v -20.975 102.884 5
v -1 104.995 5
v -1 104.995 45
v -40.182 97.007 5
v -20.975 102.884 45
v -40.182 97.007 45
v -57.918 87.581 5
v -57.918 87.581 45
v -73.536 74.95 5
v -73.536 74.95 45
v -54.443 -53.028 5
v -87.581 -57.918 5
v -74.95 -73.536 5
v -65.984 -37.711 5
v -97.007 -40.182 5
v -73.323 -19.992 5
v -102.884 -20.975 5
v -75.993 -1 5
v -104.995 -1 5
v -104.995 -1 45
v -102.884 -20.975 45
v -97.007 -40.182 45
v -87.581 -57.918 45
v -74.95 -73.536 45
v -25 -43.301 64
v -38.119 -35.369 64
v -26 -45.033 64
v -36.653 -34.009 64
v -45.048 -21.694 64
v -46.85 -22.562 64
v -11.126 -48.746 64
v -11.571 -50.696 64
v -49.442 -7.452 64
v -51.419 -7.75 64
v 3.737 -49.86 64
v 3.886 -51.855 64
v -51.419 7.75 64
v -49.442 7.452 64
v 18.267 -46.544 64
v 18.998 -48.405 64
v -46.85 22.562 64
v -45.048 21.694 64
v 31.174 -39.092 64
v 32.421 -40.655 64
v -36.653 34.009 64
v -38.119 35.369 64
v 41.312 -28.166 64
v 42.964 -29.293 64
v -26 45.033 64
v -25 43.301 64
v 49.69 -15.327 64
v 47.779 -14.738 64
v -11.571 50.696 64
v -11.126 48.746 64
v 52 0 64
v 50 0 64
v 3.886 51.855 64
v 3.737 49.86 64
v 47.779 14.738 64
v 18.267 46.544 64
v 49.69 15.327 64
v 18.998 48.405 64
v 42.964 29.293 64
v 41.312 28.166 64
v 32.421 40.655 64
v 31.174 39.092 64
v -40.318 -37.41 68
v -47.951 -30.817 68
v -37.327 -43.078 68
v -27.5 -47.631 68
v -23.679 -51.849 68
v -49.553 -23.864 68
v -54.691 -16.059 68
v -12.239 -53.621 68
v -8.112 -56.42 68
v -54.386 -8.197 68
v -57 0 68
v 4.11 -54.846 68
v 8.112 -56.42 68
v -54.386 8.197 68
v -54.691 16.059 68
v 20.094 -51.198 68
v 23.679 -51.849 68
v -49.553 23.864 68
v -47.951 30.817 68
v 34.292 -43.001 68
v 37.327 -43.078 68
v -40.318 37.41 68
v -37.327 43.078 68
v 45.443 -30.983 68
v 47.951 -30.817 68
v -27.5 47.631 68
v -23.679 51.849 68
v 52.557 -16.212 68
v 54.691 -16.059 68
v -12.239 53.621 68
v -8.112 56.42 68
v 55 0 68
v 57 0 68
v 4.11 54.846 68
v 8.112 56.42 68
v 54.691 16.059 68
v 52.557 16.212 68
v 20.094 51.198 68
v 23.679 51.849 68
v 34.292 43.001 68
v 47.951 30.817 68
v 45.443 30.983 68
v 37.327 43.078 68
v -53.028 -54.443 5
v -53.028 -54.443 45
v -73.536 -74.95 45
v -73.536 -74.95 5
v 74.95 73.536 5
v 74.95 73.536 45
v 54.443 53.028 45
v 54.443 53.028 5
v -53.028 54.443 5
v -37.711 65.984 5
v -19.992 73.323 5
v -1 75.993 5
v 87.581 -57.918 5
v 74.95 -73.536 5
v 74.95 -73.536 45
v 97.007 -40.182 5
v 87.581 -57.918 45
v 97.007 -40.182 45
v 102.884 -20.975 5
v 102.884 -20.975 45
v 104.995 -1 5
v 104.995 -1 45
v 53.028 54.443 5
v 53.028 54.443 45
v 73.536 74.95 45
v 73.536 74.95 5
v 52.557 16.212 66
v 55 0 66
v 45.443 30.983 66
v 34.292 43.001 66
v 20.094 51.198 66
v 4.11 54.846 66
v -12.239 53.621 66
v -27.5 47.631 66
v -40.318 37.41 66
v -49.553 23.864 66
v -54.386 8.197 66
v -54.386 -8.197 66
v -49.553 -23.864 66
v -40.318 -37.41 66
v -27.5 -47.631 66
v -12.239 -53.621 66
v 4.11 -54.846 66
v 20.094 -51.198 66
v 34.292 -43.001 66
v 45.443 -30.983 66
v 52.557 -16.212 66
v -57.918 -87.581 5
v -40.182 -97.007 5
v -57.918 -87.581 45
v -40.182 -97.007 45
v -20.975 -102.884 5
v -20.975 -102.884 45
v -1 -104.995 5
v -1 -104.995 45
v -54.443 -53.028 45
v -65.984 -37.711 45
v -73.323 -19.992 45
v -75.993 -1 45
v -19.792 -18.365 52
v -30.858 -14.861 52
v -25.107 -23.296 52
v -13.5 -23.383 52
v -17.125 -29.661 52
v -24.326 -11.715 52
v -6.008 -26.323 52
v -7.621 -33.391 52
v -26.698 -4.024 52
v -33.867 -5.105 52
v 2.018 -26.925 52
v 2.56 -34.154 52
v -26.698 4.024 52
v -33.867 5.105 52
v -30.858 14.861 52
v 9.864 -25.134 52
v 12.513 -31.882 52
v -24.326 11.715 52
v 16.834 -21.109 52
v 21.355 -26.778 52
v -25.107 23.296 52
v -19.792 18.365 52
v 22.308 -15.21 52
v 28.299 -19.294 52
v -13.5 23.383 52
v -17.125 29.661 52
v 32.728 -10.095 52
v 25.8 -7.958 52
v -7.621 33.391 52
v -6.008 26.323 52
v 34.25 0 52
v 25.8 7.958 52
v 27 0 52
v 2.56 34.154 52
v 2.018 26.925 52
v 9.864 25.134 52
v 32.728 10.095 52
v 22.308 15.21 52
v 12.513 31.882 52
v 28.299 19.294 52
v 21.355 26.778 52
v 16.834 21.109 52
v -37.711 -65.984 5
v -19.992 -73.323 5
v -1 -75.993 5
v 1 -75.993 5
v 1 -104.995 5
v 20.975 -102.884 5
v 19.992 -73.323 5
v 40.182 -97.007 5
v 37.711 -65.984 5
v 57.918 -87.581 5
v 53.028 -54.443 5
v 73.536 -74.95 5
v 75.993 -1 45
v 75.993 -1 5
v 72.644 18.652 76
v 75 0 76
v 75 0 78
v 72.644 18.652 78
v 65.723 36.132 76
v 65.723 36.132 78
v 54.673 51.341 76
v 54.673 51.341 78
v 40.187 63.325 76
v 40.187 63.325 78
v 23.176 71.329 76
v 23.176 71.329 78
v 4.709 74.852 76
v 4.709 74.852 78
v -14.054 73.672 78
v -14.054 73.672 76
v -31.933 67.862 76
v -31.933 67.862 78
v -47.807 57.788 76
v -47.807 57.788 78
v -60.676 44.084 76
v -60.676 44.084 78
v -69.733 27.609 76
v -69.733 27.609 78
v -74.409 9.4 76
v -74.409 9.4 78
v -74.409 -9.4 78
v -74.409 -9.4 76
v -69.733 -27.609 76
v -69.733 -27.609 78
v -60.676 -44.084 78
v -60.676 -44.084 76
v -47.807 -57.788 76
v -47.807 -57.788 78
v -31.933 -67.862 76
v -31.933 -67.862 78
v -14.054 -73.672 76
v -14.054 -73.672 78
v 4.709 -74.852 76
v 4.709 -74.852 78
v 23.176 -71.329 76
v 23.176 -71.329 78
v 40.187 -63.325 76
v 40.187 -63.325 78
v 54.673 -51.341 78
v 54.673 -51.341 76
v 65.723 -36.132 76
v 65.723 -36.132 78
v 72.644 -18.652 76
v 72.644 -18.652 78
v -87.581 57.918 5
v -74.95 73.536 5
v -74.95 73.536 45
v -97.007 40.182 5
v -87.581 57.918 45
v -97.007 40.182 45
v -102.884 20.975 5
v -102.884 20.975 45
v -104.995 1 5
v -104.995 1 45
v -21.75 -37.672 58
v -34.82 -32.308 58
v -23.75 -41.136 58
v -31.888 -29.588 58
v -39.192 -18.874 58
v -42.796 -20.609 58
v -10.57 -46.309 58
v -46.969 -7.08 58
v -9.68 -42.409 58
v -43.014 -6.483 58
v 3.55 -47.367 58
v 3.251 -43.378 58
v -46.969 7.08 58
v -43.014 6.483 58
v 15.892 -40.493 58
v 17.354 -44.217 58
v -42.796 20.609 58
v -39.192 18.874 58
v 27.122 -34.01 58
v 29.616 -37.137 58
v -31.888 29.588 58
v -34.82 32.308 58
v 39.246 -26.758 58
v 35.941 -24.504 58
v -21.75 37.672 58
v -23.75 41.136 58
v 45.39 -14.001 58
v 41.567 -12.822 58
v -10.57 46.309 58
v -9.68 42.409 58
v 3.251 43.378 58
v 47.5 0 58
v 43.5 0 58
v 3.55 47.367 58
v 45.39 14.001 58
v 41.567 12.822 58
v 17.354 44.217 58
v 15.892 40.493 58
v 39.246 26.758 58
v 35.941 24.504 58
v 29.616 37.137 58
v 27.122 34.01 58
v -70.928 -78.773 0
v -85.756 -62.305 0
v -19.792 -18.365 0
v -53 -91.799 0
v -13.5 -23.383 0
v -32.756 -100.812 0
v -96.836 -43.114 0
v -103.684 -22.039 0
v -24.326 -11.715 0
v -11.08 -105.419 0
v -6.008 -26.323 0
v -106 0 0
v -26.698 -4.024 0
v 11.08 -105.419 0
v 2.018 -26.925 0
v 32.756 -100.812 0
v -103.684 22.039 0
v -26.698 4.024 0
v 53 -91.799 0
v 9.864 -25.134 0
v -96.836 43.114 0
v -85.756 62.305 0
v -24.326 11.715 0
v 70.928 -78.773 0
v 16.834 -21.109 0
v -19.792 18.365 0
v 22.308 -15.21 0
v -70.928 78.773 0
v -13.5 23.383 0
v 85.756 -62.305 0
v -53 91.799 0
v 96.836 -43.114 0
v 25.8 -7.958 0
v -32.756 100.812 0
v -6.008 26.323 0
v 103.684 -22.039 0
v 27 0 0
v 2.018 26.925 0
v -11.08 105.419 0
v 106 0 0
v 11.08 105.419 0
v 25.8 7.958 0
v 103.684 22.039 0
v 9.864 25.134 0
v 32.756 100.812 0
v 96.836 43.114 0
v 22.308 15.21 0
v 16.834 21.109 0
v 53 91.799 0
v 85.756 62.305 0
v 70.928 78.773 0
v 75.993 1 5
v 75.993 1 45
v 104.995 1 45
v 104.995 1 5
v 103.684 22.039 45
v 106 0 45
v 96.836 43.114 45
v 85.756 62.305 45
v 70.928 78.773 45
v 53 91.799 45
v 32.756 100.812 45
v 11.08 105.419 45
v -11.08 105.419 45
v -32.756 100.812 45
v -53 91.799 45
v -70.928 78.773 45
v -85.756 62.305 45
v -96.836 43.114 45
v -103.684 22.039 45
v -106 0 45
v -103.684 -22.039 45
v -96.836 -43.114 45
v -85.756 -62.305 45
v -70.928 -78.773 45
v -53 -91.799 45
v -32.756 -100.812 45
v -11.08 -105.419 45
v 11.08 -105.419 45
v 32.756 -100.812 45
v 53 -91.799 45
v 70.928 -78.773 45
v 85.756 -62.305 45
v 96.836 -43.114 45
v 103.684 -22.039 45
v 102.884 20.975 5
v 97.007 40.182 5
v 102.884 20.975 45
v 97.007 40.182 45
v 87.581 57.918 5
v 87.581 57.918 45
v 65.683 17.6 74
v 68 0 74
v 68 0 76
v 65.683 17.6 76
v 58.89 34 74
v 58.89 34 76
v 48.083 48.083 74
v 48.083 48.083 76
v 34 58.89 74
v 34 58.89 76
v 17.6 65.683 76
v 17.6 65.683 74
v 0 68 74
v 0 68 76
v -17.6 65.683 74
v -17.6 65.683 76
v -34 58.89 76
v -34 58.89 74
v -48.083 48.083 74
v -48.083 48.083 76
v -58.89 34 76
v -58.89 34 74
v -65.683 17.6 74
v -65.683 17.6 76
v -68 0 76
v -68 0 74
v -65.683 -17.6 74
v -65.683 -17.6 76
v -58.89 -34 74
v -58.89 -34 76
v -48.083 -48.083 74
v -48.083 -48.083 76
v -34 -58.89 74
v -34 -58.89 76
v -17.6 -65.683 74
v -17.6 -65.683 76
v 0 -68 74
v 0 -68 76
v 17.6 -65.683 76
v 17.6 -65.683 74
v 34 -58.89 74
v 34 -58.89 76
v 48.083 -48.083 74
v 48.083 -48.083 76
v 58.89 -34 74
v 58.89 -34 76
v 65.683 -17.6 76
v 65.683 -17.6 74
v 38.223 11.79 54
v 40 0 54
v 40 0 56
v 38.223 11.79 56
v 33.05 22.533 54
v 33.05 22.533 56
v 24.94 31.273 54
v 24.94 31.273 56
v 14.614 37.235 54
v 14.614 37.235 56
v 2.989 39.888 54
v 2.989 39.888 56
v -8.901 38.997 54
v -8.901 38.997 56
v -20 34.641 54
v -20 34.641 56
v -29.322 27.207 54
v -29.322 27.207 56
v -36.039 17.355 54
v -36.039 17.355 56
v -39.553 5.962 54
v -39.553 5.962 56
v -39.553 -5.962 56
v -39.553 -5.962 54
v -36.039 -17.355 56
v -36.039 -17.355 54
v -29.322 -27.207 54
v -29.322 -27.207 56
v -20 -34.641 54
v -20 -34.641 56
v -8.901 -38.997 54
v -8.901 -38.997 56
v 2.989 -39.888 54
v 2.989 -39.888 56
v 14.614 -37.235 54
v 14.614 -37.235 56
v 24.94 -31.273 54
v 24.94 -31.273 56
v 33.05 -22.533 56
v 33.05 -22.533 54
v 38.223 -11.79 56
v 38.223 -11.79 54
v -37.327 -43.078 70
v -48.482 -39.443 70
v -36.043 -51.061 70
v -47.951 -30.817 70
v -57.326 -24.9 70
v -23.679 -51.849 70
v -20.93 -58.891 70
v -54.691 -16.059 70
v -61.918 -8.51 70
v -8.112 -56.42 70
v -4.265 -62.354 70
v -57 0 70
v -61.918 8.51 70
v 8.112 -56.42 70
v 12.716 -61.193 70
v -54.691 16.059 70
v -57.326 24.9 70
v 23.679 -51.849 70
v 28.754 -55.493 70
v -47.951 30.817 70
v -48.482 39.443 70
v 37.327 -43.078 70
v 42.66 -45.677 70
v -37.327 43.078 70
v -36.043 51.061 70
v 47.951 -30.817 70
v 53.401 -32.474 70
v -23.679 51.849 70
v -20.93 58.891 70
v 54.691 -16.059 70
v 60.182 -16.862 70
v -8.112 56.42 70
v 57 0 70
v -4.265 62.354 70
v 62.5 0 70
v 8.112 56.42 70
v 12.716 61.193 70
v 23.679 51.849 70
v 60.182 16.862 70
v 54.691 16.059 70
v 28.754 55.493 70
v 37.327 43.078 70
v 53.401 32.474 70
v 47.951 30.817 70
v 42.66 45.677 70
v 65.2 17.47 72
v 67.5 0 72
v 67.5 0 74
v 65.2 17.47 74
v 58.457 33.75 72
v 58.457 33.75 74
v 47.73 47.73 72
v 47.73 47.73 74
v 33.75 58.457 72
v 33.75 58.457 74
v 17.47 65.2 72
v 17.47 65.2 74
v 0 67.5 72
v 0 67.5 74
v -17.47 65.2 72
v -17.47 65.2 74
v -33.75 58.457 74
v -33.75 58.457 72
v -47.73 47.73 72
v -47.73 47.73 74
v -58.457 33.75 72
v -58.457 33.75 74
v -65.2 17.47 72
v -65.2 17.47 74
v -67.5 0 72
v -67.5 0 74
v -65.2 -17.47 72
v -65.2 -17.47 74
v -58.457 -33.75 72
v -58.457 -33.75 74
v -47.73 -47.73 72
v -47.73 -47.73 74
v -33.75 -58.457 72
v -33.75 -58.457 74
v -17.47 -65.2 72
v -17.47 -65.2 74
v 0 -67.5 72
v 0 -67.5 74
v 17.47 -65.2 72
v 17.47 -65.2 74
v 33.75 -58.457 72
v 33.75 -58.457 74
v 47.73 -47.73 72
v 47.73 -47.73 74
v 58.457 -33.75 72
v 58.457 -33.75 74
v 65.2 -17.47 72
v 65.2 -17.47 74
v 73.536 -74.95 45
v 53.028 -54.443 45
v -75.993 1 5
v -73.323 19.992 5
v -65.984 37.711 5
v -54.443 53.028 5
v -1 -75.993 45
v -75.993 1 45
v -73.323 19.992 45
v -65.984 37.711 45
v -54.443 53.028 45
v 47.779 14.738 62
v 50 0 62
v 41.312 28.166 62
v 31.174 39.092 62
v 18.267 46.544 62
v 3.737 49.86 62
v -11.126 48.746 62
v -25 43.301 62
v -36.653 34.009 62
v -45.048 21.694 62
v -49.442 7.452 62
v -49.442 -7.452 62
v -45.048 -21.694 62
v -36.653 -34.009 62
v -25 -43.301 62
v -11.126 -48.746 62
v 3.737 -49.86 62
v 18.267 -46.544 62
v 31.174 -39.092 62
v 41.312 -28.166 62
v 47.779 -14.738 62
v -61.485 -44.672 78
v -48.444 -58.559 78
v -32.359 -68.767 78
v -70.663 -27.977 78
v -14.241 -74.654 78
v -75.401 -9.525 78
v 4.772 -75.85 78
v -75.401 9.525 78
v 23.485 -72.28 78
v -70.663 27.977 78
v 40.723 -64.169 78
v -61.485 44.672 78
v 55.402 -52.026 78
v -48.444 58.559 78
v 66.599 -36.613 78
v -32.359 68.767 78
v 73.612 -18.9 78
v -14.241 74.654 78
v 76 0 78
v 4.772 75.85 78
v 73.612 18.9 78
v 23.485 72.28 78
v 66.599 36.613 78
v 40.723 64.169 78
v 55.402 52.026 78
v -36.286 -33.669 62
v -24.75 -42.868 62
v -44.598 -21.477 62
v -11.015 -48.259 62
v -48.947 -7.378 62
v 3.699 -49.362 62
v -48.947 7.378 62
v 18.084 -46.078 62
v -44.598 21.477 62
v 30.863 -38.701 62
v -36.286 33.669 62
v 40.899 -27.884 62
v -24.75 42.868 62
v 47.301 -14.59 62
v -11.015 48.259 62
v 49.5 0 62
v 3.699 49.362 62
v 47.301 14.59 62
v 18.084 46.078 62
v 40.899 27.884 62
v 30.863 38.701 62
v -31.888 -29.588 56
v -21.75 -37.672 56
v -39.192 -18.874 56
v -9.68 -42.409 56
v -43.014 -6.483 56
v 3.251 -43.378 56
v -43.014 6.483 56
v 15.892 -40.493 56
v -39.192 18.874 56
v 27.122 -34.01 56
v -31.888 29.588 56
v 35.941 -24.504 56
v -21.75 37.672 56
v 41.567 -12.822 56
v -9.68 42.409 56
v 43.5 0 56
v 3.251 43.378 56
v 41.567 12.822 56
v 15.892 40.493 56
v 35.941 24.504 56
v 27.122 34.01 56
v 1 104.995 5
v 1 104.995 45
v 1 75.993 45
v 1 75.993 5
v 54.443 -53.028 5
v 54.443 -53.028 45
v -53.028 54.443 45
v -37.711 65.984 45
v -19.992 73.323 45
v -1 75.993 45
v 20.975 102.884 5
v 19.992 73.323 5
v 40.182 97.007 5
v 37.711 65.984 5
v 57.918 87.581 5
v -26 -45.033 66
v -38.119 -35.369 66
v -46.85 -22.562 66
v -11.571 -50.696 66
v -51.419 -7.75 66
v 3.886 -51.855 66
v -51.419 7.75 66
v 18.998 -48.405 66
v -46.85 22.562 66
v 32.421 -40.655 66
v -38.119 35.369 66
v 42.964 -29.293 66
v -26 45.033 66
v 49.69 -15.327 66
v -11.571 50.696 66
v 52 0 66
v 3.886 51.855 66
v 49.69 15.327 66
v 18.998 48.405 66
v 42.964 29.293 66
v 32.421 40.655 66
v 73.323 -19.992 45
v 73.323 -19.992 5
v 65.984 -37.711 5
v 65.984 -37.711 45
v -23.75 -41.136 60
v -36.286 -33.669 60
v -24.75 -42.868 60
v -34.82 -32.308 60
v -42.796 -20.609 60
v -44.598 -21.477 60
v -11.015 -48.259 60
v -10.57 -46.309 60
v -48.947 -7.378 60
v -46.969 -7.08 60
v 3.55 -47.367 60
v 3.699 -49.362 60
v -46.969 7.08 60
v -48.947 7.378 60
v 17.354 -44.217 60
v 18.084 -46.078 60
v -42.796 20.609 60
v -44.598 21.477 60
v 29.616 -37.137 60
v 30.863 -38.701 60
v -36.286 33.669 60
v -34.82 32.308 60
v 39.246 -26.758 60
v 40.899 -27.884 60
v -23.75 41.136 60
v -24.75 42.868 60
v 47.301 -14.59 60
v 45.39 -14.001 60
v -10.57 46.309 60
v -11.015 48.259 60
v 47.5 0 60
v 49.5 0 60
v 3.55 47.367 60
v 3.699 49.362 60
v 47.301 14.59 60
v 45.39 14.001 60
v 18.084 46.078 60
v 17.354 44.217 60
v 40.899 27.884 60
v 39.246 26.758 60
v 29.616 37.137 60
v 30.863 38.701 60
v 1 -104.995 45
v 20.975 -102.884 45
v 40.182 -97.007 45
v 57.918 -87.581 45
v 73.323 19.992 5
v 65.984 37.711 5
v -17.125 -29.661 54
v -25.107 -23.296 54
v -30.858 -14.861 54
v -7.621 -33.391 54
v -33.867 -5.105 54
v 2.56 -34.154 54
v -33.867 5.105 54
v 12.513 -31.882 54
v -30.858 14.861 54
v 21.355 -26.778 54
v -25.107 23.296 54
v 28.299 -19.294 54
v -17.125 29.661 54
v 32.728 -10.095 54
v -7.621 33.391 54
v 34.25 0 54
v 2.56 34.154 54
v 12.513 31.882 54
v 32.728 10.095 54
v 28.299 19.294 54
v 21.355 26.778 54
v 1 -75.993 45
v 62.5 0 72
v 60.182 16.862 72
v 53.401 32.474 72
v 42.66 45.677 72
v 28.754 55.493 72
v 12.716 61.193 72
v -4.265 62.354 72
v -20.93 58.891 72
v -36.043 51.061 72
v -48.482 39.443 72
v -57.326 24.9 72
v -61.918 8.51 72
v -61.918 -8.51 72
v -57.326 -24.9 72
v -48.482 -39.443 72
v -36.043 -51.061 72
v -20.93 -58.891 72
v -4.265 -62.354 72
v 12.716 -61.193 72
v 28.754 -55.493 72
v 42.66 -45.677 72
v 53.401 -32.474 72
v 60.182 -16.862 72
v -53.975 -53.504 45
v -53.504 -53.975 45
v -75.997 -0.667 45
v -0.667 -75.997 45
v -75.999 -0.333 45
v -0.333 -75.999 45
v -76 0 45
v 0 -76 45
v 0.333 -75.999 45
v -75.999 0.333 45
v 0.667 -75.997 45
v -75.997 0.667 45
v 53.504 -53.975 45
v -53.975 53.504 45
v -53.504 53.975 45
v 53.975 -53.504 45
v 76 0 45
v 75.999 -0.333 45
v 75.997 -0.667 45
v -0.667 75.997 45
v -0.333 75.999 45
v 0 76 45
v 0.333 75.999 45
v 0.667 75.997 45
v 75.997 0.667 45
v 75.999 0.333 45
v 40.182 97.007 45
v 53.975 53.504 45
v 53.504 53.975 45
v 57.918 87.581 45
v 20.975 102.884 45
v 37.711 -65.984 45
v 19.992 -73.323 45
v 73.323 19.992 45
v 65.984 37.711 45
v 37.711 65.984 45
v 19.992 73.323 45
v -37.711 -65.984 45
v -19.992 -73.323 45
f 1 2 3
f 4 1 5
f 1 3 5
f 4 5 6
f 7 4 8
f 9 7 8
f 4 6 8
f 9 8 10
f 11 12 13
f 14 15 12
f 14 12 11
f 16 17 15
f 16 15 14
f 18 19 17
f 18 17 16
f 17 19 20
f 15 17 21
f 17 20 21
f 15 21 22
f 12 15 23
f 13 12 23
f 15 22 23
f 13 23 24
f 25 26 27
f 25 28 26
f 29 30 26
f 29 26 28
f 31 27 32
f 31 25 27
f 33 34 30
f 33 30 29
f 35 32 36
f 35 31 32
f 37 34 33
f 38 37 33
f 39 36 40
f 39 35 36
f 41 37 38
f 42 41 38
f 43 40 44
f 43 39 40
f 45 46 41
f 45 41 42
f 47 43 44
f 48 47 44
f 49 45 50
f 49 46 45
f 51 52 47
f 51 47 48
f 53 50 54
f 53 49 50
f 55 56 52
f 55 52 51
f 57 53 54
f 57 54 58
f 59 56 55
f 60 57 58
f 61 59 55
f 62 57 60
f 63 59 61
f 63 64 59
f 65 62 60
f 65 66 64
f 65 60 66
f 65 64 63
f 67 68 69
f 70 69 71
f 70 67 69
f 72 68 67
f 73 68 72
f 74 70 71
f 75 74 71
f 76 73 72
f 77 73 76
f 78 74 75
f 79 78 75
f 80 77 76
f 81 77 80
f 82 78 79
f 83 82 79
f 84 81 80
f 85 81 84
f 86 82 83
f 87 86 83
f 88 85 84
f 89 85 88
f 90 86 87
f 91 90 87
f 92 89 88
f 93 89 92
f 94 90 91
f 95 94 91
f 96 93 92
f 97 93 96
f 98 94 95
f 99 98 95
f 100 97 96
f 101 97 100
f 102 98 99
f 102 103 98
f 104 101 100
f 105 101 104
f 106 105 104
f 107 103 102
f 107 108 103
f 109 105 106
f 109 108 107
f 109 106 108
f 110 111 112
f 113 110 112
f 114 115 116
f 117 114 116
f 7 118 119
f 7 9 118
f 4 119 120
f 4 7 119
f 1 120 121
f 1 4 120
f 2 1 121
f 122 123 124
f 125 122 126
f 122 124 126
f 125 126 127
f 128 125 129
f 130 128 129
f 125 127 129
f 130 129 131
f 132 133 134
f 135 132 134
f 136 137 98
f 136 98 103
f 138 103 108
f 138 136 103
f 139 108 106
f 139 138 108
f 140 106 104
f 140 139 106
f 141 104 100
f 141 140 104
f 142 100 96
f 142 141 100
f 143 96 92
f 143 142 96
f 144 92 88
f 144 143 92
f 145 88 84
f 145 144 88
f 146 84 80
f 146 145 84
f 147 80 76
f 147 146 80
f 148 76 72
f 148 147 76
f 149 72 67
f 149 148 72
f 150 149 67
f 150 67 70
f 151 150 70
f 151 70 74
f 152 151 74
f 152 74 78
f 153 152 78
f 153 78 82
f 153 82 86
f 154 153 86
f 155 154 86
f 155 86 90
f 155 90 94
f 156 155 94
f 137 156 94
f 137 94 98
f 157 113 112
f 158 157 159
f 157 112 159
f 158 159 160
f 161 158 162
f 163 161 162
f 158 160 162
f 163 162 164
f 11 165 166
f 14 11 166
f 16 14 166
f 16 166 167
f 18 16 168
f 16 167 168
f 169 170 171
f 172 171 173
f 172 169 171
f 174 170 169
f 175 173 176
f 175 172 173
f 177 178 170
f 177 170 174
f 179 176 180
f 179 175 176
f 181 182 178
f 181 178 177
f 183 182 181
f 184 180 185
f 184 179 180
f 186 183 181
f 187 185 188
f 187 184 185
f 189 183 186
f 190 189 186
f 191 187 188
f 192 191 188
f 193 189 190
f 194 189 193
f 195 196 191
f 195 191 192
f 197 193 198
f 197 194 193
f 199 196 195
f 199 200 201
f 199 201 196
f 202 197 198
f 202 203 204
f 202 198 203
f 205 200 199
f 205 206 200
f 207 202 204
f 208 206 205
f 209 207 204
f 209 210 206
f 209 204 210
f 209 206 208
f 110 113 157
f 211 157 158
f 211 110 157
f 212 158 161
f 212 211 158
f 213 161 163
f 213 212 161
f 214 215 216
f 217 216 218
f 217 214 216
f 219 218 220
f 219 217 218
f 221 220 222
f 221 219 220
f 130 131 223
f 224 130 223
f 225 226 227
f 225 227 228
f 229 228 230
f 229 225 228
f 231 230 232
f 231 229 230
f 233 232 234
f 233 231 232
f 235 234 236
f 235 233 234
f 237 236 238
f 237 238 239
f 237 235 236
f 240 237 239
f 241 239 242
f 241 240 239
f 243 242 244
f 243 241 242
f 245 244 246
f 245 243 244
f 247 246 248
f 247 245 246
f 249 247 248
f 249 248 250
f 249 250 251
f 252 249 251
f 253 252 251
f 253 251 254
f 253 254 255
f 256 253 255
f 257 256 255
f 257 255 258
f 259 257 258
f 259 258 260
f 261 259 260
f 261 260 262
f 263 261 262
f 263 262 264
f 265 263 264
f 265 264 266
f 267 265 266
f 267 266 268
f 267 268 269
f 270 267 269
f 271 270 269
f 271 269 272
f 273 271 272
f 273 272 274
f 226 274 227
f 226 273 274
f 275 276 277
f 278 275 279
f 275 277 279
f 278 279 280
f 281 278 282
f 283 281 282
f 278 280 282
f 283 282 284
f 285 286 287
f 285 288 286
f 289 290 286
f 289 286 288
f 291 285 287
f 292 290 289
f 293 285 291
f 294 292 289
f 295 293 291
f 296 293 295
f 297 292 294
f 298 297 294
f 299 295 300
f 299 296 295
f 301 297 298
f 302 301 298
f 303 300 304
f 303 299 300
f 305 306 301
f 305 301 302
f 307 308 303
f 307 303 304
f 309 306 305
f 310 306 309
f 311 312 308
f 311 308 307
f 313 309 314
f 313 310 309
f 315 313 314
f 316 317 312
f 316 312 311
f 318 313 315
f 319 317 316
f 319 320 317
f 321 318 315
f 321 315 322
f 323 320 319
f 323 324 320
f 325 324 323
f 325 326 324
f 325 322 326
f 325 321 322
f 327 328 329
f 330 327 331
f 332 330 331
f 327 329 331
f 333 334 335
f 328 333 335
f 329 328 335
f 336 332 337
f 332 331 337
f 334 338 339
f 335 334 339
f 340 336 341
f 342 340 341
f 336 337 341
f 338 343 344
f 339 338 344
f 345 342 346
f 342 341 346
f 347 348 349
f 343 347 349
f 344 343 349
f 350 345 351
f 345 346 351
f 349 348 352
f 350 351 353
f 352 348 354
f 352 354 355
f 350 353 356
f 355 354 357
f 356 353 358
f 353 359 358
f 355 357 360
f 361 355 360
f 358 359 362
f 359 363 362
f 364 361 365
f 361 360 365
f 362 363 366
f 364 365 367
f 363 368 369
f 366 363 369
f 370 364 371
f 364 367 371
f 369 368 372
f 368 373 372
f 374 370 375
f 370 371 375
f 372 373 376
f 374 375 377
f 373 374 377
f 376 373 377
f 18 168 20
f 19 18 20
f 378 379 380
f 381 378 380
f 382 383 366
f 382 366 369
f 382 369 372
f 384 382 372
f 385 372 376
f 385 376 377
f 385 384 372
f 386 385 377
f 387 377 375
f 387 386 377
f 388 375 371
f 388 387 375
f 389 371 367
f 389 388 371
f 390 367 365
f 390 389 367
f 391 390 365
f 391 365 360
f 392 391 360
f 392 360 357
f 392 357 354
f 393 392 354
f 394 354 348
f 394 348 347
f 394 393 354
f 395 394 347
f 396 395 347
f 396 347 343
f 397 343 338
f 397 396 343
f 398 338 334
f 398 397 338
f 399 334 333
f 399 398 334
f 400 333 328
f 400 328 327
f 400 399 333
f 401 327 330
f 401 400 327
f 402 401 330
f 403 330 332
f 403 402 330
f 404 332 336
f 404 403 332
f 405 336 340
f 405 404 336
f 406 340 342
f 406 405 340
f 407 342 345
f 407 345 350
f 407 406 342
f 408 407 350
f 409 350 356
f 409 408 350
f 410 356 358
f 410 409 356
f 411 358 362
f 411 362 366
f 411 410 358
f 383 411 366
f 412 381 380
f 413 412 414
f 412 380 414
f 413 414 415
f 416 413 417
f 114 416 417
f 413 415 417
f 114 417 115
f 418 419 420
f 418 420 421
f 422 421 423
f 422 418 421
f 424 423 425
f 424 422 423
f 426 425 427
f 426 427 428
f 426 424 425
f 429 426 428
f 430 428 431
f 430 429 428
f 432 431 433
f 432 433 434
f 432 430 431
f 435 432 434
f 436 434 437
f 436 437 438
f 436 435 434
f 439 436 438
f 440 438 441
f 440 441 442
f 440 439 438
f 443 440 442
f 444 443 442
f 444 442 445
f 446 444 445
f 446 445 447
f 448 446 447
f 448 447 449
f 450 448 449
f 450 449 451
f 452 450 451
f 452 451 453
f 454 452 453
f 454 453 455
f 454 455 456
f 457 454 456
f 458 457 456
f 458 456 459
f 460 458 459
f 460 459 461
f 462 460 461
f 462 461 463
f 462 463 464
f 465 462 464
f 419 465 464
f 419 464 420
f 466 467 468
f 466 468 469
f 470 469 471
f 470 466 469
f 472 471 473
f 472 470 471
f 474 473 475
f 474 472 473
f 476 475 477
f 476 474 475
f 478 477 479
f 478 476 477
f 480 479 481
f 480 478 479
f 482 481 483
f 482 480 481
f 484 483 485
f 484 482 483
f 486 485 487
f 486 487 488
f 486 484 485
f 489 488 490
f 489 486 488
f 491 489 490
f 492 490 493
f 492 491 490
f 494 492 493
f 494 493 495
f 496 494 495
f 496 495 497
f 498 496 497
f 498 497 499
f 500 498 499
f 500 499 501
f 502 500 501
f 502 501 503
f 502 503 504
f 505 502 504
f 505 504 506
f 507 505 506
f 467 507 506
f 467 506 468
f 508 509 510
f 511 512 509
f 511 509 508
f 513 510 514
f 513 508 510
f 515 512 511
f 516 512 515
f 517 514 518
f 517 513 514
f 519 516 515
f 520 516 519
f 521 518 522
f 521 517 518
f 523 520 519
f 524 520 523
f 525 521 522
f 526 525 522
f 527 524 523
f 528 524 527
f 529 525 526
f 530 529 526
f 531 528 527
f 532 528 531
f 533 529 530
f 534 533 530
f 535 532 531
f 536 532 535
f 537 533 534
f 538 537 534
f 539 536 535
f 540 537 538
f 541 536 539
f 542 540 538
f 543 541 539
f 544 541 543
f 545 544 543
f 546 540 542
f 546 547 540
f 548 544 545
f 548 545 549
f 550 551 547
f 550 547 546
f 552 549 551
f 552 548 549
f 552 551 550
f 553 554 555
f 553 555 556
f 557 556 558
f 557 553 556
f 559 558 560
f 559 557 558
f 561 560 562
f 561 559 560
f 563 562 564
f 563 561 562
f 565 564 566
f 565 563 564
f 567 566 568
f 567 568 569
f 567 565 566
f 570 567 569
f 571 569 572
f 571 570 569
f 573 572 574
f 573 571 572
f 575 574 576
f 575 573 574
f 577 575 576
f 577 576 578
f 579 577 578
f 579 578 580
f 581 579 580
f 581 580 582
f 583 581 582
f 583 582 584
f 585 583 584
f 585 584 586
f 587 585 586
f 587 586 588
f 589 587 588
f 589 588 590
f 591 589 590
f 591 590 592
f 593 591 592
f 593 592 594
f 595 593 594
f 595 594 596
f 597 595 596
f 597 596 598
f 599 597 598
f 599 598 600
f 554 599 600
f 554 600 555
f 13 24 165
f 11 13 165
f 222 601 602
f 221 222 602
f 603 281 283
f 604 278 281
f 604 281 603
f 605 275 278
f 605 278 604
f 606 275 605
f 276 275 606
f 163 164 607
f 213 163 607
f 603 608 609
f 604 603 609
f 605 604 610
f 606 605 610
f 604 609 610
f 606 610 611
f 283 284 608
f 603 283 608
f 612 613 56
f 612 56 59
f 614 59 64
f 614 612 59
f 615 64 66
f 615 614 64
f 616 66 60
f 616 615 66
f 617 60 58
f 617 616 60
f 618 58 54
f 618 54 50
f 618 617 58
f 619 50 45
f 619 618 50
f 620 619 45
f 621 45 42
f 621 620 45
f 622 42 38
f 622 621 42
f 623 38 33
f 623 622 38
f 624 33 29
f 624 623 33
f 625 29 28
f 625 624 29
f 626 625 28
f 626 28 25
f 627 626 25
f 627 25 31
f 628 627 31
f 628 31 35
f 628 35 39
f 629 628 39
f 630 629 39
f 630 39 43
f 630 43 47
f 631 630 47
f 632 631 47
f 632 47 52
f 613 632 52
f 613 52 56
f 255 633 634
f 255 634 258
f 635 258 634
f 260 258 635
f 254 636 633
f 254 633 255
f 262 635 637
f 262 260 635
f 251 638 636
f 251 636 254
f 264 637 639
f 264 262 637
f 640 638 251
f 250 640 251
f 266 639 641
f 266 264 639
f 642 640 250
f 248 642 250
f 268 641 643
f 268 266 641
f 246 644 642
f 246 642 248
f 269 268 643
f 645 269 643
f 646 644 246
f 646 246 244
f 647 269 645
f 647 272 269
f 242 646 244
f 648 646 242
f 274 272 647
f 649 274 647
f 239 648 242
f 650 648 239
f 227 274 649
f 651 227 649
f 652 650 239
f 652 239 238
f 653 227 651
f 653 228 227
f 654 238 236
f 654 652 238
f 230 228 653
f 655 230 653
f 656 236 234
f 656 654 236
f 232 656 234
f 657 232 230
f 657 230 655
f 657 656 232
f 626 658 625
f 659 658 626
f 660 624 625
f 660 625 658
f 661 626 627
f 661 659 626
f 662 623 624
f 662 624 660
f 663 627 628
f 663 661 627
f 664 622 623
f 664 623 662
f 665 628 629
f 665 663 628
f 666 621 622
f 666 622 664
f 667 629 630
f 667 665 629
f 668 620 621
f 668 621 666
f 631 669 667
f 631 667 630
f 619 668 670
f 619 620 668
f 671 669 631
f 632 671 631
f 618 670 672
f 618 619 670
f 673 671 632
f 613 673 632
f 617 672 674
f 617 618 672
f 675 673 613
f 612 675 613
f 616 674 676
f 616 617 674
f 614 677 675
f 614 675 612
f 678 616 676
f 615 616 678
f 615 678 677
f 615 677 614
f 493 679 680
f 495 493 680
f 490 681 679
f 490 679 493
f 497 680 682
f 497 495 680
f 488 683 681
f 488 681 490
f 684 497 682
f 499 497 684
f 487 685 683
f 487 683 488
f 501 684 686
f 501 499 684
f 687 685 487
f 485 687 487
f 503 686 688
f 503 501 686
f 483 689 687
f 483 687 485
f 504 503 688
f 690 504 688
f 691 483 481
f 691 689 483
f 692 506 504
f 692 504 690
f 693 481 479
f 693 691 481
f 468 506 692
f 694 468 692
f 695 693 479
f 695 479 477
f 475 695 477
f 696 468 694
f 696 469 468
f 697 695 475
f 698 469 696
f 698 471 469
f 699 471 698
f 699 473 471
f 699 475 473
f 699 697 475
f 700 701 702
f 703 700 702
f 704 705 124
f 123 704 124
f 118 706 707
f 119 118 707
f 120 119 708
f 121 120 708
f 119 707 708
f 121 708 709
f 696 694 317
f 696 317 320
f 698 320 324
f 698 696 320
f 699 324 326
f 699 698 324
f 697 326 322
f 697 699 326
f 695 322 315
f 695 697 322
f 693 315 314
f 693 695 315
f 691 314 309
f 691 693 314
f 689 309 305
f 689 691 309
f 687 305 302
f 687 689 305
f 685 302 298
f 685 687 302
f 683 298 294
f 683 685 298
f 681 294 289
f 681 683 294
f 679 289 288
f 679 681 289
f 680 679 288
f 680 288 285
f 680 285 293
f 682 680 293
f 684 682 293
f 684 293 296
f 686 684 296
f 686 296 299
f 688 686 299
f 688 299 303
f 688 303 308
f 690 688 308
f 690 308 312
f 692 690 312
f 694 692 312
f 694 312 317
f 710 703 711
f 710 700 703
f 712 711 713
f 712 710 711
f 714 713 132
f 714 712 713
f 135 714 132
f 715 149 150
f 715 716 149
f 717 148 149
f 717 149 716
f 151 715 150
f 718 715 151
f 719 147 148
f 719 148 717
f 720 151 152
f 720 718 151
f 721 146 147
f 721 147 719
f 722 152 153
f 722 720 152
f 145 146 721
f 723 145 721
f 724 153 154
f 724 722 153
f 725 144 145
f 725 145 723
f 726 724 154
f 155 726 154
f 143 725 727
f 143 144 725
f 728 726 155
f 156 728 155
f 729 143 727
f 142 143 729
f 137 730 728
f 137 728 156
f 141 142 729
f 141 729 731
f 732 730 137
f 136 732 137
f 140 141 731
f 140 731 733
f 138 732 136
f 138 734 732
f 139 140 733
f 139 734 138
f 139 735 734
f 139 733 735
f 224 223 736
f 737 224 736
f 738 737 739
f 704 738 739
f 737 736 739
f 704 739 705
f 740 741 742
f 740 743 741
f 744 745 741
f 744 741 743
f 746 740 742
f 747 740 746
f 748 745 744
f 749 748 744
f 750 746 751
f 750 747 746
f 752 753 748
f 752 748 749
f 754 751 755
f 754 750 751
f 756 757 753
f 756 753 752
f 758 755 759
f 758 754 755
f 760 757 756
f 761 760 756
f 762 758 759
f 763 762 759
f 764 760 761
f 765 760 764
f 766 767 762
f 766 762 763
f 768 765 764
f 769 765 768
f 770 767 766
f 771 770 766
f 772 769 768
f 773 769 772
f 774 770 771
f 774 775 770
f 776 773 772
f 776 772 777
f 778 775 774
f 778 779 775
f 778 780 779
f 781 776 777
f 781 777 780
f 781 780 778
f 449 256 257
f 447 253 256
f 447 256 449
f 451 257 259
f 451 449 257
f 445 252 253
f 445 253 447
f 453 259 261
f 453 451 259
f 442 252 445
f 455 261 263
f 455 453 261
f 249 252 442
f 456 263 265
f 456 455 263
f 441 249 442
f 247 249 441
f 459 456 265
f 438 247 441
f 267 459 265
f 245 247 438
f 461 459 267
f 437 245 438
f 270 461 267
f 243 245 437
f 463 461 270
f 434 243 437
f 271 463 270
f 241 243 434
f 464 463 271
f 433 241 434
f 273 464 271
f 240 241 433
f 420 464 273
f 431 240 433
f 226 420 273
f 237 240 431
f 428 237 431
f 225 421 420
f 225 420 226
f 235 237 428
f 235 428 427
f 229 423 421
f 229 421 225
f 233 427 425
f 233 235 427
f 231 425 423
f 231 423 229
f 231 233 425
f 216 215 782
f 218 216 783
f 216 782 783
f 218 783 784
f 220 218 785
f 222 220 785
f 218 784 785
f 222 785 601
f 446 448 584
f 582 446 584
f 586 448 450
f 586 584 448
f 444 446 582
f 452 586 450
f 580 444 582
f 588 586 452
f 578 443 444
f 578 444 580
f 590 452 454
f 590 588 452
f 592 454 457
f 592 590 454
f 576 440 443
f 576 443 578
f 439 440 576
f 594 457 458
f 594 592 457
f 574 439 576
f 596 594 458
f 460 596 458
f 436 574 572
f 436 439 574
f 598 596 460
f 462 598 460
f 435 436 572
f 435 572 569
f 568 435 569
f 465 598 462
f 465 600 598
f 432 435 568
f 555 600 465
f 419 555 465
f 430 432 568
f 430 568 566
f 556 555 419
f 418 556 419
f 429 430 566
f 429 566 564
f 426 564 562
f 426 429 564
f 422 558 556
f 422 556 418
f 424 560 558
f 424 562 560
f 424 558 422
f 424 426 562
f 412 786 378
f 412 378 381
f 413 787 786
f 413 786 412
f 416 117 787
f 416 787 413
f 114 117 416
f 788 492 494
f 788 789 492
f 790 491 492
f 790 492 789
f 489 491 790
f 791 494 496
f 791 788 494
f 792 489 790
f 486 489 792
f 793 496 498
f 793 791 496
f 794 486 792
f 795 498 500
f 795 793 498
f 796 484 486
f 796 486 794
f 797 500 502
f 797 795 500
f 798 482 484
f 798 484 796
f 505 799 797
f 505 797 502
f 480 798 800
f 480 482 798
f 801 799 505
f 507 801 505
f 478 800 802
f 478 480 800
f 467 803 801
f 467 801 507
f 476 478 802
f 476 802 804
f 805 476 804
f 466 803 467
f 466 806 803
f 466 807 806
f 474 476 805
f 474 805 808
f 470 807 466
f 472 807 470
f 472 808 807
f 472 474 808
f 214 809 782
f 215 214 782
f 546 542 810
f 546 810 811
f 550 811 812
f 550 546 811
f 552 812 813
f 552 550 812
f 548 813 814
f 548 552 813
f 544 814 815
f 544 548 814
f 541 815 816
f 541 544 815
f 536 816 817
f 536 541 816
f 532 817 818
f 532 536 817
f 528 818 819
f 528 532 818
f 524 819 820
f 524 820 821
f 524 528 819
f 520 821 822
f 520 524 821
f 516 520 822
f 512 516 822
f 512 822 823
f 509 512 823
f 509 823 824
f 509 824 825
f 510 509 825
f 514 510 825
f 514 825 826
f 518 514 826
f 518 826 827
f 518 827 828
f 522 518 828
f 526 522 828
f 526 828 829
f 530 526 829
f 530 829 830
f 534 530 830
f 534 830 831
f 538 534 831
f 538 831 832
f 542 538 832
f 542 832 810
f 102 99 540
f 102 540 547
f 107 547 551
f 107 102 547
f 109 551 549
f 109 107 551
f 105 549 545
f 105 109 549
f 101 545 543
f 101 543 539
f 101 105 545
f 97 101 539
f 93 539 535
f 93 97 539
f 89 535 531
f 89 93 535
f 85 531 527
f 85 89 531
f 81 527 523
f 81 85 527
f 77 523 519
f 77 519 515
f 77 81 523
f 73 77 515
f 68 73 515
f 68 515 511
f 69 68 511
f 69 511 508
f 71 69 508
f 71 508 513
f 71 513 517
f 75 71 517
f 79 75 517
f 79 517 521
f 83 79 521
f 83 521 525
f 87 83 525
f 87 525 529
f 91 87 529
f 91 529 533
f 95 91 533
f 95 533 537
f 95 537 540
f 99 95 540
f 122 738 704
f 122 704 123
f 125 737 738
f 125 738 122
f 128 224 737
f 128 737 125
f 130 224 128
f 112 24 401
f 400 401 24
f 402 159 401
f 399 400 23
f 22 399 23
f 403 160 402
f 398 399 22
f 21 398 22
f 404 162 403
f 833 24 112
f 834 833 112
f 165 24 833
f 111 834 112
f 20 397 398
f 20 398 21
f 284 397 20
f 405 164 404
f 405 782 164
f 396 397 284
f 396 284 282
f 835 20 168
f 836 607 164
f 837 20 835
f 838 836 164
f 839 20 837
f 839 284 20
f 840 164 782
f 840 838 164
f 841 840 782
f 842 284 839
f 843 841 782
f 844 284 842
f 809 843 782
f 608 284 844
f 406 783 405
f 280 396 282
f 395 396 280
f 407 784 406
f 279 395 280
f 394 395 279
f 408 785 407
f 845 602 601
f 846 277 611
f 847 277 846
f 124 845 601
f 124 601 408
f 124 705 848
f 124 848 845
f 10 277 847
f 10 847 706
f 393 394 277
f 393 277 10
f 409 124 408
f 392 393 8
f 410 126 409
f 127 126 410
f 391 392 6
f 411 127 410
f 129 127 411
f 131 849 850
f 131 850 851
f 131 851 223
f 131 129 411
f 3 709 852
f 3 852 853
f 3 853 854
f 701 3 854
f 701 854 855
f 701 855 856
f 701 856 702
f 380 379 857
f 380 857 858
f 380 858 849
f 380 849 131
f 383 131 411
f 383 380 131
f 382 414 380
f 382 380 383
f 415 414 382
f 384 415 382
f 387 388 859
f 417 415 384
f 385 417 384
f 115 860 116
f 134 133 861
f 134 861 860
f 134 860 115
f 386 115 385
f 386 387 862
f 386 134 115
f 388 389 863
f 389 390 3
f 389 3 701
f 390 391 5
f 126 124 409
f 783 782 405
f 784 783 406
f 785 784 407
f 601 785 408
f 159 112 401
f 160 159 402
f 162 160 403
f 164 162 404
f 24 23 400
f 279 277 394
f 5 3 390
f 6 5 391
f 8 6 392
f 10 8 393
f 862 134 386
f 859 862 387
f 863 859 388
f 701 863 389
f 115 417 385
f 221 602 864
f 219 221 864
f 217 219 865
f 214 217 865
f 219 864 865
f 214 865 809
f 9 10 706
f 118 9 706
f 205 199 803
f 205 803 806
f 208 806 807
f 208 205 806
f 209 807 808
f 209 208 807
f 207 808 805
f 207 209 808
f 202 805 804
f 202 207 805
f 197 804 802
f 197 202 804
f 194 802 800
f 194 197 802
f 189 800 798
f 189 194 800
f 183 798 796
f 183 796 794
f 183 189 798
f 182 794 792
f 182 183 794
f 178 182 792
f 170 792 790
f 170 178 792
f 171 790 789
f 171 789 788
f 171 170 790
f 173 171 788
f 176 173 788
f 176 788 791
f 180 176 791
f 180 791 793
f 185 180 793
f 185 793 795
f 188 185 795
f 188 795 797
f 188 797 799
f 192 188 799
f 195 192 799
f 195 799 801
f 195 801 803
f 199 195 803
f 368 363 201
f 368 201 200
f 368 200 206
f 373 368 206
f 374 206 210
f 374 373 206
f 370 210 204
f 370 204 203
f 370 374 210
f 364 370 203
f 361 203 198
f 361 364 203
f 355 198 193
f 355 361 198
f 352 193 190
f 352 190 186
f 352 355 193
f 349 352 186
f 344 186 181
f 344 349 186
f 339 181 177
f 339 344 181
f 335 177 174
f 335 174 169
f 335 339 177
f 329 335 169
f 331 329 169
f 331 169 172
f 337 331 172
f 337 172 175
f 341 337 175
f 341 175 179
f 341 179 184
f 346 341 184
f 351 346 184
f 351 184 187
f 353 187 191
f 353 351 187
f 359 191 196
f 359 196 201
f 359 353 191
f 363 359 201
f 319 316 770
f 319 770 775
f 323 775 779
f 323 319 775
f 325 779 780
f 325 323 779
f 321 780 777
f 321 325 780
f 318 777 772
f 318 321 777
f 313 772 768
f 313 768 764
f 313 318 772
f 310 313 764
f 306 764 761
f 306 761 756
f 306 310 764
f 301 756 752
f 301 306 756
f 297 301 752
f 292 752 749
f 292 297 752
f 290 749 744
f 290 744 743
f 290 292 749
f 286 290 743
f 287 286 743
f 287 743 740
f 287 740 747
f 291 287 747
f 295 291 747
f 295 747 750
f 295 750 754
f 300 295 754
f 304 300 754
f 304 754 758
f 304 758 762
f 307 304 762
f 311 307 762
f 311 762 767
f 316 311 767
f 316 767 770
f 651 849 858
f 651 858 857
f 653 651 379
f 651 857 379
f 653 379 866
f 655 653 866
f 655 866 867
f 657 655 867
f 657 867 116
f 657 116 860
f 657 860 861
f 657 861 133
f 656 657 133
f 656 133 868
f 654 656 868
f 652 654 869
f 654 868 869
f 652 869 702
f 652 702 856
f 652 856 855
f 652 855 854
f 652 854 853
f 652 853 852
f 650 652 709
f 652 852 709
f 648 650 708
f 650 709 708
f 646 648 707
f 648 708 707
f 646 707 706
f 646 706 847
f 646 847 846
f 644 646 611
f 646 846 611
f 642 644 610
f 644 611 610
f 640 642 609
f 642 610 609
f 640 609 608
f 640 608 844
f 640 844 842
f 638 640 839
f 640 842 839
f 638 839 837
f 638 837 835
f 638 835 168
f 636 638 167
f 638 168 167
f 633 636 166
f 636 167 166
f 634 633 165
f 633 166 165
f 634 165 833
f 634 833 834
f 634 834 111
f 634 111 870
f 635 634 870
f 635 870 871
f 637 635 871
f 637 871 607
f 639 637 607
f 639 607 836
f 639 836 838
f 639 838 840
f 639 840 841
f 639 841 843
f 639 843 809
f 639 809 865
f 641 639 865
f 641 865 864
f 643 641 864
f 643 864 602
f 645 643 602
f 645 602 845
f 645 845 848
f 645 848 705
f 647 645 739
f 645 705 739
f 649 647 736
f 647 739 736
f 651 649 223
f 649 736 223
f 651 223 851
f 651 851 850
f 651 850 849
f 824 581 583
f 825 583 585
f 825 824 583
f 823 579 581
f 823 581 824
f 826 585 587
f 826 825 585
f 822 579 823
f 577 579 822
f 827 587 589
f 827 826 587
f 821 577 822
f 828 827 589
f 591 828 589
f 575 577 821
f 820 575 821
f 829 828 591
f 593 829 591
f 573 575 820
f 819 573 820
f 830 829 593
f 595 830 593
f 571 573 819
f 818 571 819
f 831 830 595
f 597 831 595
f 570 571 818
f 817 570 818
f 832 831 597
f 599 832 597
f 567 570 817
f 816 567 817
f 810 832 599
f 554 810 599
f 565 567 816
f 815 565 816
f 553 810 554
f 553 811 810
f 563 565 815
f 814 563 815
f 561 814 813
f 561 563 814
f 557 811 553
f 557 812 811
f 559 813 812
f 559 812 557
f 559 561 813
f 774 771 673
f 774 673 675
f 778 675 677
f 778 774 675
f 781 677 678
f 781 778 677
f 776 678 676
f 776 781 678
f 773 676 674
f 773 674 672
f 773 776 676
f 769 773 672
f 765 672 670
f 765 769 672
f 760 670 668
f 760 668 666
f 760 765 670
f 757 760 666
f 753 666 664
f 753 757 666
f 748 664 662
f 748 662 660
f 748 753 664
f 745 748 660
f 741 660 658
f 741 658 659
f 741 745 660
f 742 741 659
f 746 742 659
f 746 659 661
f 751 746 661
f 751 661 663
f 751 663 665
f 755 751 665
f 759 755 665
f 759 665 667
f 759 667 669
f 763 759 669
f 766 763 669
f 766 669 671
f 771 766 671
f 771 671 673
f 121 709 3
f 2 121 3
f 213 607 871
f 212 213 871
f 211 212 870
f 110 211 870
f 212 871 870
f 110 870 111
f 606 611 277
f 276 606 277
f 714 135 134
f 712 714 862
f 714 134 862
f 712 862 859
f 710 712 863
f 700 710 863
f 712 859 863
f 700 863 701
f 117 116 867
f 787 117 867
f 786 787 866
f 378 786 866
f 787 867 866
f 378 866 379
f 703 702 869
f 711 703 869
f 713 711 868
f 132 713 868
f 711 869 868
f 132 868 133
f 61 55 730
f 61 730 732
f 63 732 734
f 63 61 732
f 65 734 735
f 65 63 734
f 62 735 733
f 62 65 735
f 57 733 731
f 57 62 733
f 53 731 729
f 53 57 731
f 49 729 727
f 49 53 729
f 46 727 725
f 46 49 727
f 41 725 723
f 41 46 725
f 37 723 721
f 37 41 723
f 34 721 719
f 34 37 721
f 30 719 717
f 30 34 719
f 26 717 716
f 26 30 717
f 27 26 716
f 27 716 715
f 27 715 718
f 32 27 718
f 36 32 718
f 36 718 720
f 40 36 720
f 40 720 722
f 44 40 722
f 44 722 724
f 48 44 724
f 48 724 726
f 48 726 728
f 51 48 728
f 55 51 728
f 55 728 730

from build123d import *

# Parameters (mm, degrees)
F0_R      = 34.25
F0_R_2    = 27
F1_DEPTH  = 52
F2_R      = 40
F2_R_2    = 34.25
F3_DEPTH  = 54
F4_R      = 43.5
F4_R_2    = 40
F5_DEPTH  = 56
F6_R      = 47.5
F6_R_2    = 43.5
F7_DEPTH  = 58
F8_R      = 49.5
F8_R_2    = 47.5
F9_DEPTH  = 60
F10_R     = 50
F10_R_2   = 49.5
F11_DEPTH = 62
F12_R     = 52
F12_R_2   = 50
F13_DEPTH = 64
F14_R     = 55
F14_R_2   = 52
F15_DEPTH = 66
F16_R     = 57
F16_R_2   = 55
F17_DEPTH = 68
F18_R     = 62.5
F18_R_2   = 57
F19_DEPTH = 70
F20_R     = 67.5
F20_R_2   = 62.5
F21_DEPTH = 72
F22_R     = 68
F22_R_2   = 67.5
F23_DEPTH = 74
F24_R     = 75
F24_R_2   = 68
F25_DEPTH = 76
F26_R     = 76
F26_R_2   = 75
F27_DEPTH = 78
F29_DEPTH = 45
F30_R     = 106
F31_DEPTH = 45
F32_DEPTH = 40


# Not quite as in the source:
# - after a boolean that leaves OpenCascade's solid faulty, fix() repairs it


with BuildPart() as f1:
    # F0 (on Top) → F1 (new body)
    with BuildSketch(Plane.XY):
        Circle(F0_R)
        Circle(F0_R_2, mode=Mode.SUBTRACT)
    extrude(amount=F1_DEPTH)

    # F2 (on Top) → F3 (join)
    with BuildSketch(Plane.XY):
        Circle(F2_R)
        Circle(F2_R_2, mode=Mode.SUBTRACT)
    extrude(amount=F3_DEPTH)

    # F4 (on Top) → F5 (join)
    with BuildSketch(Plane.XY):
        Circle(F4_R)
        Circle(F4_R_2, mode=Mode.SUBTRACT)
    extrude(amount=F5_DEPTH)

    # F6 (on Top) → F7 (join)
    with BuildSketch(Plane.XY):
        Circle(F6_R)
        Circle(F6_R_2, mode=Mode.SUBTRACT)
    extrude(amount=F7_DEPTH)

    # F8 (on Top) → F9 (join)
    with BuildSketch(Plane.XY):
        Circle(F8_R)
        Circle(F8_R_2, mode=Mode.SUBTRACT)
    extrude(amount=F9_DEPTH)

    # F10 (on Top) → F11 (join)
    with BuildSketch(Plane.XY):
        Circle(F10_R)
        Circle(F10_R_2, mode=Mode.SUBTRACT)
    extrude(amount=F11_DEPTH)

    # F12 (on Top) → F13 (join)
    with BuildSketch(Plane.XY):
        Circle(F12_R)
        Circle(F12_R_2, mode=Mode.SUBTRACT)
    extrude(amount=F13_DEPTH)

    # F14 (on Top) → F15 (join)
    with BuildSketch(Plane.XY):
        Circle(F14_R)
        Circle(F14_R_2, mode=Mode.SUBTRACT)
    extrude(amount=F15_DEPTH)

    # F16 (on Top) → F17 (join)
    with BuildSketch(Plane.XY):
        Circle(F16_R)
        Circle(F16_R_2, mode=Mode.SUBTRACT)
    extrude(amount=F17_DEPTH)

    # F18 (on Top) → F19 (join)
    with BuildSketch(Plane.XY):
        Circle(F18_R)
        Circle(F18_R_2, mode=Mode.SUBTRACT)
    extrude(amount=F19_DEPTH)

    # F20 (on Top) → F21 (join)
    with BuildSketch(Plane.XY):
        Circle(F20_R)
        Circle(F20_R_2, mode=Mode.SUBTRACT)
    extrude(amount=F21_DEPTH)

    # F22 (on Top) → F23 (join)
    with BuildSketch(Plane.XY):
        Circle(F22_R)
        Circle(F22_R_2, mode=Mode.SUBTRACT)
    extrude(amount=F23_DEPTH)

    # F24 (on Top) → F25 (join)
    with BuildSketch(Plane.XY):
        Circle(F24_R)
        Circle(F24_R_2, mode=Mode.SUBTRACT)
    extrude(amount=F25_DEPTH)

    # F26 (on Top) → F27 (join)
    with BuildSketch(Plane.XY):
        Circle(F26_R)
        Circle(F26_R_2, mode=Mode.SUBTRACT)
    extrude(amount=F27_DEPTH)

    # F28 (on Top) → F29 (join)
    with BuildSketch(Plane.XY):
        with BuildLine():
            Line((105, 0), (76, 0))
            ThreePointArc((76, 0), (69.7127627842, -30.267651131), (51.8912972371, -55.5274100877))
            Line((51.8912972371, -55.5274100877), (72.4058930172, -76.0420058677))
            ThreePointArc((72.4058930172, -76.0420058677), (96.5080793685, -41.366539819), (105, 0))
        make_face()
        with BuildLine():
            ThreePointArc((55.5274100877, 51.8912972371), (70.6968286653, 27.8919059347), (76, 0))
            Line((76, 0), (105, 0))
            ThreePointArc((105, 0), (97.492078181, 38.9909565405), (76.0420058677, 72.4058930172))
            Line((76.0420058677, 72.4058930172), (55.5274100877, 51.8912972371))
        make_face()
        with BuildLine():
            ThreePointArc((0, 76), (30.267651131, 69.7127627842), (55.5274100877, 51.8912972371))
            Line((55.5274100877, 51.8912972371), (76.0420058677, 72.4058930172))
            ThreePointArc((76.0420058677, 72.4058930172), (41.366539819, 96.5080793685), (0, 105))
            Line((0, 105), (0, 76))
        make_face()
        with BuildLine():
            Line((72.4058930172, -76.0420058677), (51.8912972371, -55.5274100877))
            ThreePointArc((51.8912972371, -55.5274100877), (27.8919059347, -70.6968286653), (0, -76))
            Line((0, -76), (0, -105))
            ThreePointArc((0, -105), (38.9909565405, -97.492078181), (72.4058930172, -76.0420058677))
        make_face()
        with BuildLine():
            ThreePointArc((-51.8912972371, 55.5274100877), (-27.8919059347, 70.6968286653), (0, 76))
            Line((0, 76), (0, 105))
            ThreePointArc((0, 105), (-38.9909565405, 97.492078181), (-72.4058930172, 76.0420058677))
            Line((-72.4058930172, 76.0420058677), (-51.8912972371, 55.5274100877))
        make_face()
        with BuildLine():
            Line((0, -105), (0, -76))
            ThreePointArc((0, -76), (-30.267651131, -69.7127627842), (-55.5274100877, -51.8912972371))
            Line((-55.5274100877, -51.8912972371), (-76.0420058677, -72.4058930172))
            ThreePointArc((-76.0420058677, -72.4058930172), (-41.366539819, -96.5080793685), (0, -105))
        make_face()
        with BuildLine():
            ThreePointArc((-76, 0), (-69.7127627842, 30.267651131), (-51.8912972371, 55.5274100877))
            Line((-51.8912972371, 55.5274100877), (-72.4058930172, 76.0420058677))
            ThreePointArc((-72.4058930172, 76.0420058677), (-96.5080793685, 41.366539819), (-105, 0))
            Line((-105, 0), (-76, 0))
        make_face()
        with BuildLine():
            Line((-76.0420058677, -72.4058930172), (-55.5274100877, -51.8912972371))
            ThreePointArc((-55.5274100877, -51.8912972371), (-70.6968286653, -27.8919059347), (-76, 0))
            Line((-76, 0), (-105, 0))
            ThreePointArc((-105, 0), (-97.492078181, -38.9909565405), (-76.0420058677, -72.4058930172))
        make_face()
    extrude(amount=F29_DEPTH)

    # F30 (on face) → F31 (join)
    with BuildSketch(Plane.XY.offset(45)):
        Circle(F30_R)
        with BuildLine():
            ThreePointArc((74.9499515543, 73.5357379919), (97.0073509137, 40.1817603983), (104.9952379873, 1))
            ThreePointArc((104.9952379873, 1), (104.9988094901, 0.5000056692), (105, 0))
            ThreePointArc((105, 0), (104.9988094901, -0.5000056692), (104.9952379873, -1))
            ThreePointArc((104.9952379873, -1), (97.0073509137, -40.1817603983), (74.9499515543, -73.5357379919))
            ThreePointArc((74.9499515543, -73.5357379919), (74.2462120246, -74.2462120246), (73.5357379919, -74.9499515543))
            ThreePointArc((73.5357379919, -74.9499515543), (40.1817603983, -97.0073509137), (1, -104.9952379873))
            ThreePointArc((1, -104.9952379873), (0, -105), (-1, -104.9952379873))
            ThreePointArc((-1, -104.9952379873), (-40.1817603983, -97.0073509137), (-73.5357379919, -74.9499515543))
            ThreePointArc((-73.5357379919, -74.9499515543), (-74.2462120246, -74.2462120246), (-74.9499515543, -73.5357379919))
            ThreePointArc((-74.9499515543, -73.5357379919), (-97.0073509137, -40.1817603983), (-104.9952379873, -1))
            ThreePointArc((-104.9952379873, -1), (-105, 0), (-104.9952379873, 1))
            ThreePointArc((-104.9952379873, 1), (-97.0073509137, 40.1817603983), (-74.9499515543, 73.5357379919))
            ThreePointArc((-74.9499515543, 73.5357379919), (-74.2462120246, 74.2462120246), (-73.5357379919, 74.9499515543))
            ThreePointArc((-73.5357379919, 74.9499515543), (-40.1817603983, 97.0073509137), (-1, 104.9952379873))
            ThreePointArc((-1, 104.9952379873), (0, 105), (1, 104.9952379873))
            ThreePointArc((1, 104.9952379873), (40.1817603983, 97.0073509137), (73.5357379919, 74.9499515543))
            ThreePointArc((73.5357379919, 74.9499515543), (74.2462120246, 74.2462120246), (74.9499515543, 73.5357379919))
        make_face(mode=Mode.SUBTRACT)
    extrude(amount=-F31_DEPTH)

    # F30 (on face) → F32 (cut)
    with BuildSketch(Plane.XY.offset(45)):
        with BuildLine():
            Line((-74.9499515543, -73.5357379919), (-54.4425699317, -53.0283563693))
            ThreePointArc((-54.4425699317, -53.0283563693), (-70.2148444709, -29.0839408597), (-75.9934207679, -1))
            Line((-75.9934207679, -1), (-104.9952379873, -1))
            ThreePointArc((-104.9952379873, -1), (-97.0073509137, -40.1817603983), (-74.9499515543, -73.5357379919))
        make_face()
        with BuildLine():
            ThreePointArc((-75.9934207679, 1), (-70.2148444709, 29.0839408597), (-54.4425699317, 53.0283563693))
            Line((-54.4425699317, 53.0283563693), (-74.9499515543, 73.5357379919))
            ThreePointArc((-74.9499515543, 73.5357379919), (-97.0073509137, 40.1817603983), (-104.9952379873, 1))
            Line((-104.9952379873, 1), (-75.9934207679, 1))
        make_face()
        with BuildLine():
            ThreePointArc((-53.0283563693, 54.4425699317), (-29.0839408597, 70.2148444709), (-1, 75.9934207679))
            Line((-1, 75.9934207679), (-1, 104.9952379873))
            ThreePointArc((-1, 104.9952379873), (-40.1817603983, 97.0073509137), (-73.5357379919, 74.9499515543))
            Line((-73.5357379919, 74.9499515543), (-53.0283563693, 54.4425699317))
        make_face()
        with BuildLine():
            ThreePointArc((1, 75.9934207679), (29.0839408597, 70.2148444709), (53.0283563693, 54.4425699317))
            Line((53.0283563693, 54.4425699317), (73.5357379919, 74.9499515543))
            ThreePointArc((73.5357379919, 74.9499515543), (40.1817603983, 97.0073509137), (1, 104.9952379873))
            Line((1, 104.9952379873), (1, 75.9934207679))
        make_face()
        with BuildLine():
            ThreePointArc((54.4425699317, 53.0283563693), (70.2148444709, 29.0839408597), (75.9934207679, 1))
            Line((75.9934207679, 1), (104.9952379873, 1))
            ThreePointArc((104.9952379873, 1), (97.0073509137, 40.1817603983), (74.9499515543, 73.5357379919))
            Line((74.9499515543, 73.5357379919), (54.4425699317, 53.0283563693))
        make_face()
        with BuildLine():
            Line((104.9952379873, -1), (75.9934207679, -1))
            ThreePointArc((75.9934207679, -1), (70.2148444709, -29.0839408597), (54.4425699317, -53.0283563693))
            Line((54.4425699317, -53.0283563693), (74.9499515543, -73.5357379919))
            ThreePointArc((74.9499515543, -73.5357379919), (97.0073509137, -40.1817603983), (104.9952379873, -1))
        make_face()
        with BuildLine():
            Line((73.5357379919, -74.9499515543), (53.0283563693, -54.4425699317))
            ThreePointArc((53.0283563693, -54.4425699317), (29.0839408597, -70.2148444709), (1, -75.9934207679))
            Line((1, -75.9934207679), (1, -104.9952379873))
            ThreePointArc((1, -104.9952379873), (40.1817603983, -97.0073509137), (73.5357379919, -74.9499515543))
        make_face()
        with BuildLine():
            Line((-1, -104.9952379873), (-1, -75.9934207679))
            ThreePointArc((-1, -75.9934207679), (-29.0839408597, -70.2148444709), (-53.0283563693, -54.4425699317))
            Line((-53.0283563693, -54.4425699317), (-73.5357379919, -74.9499515543))
            ThreePointArc((-73.5357379919, -74.9499515543), (-40.1817603983, -97.0073509137), (-1, -104.9952379873))
        make_face()
    extrude(amount=-F32_DEPTH, mode=Mode.SUBTRACT)

    add(f1.part.fix(), mode=Mode.REPLACE)


solid = f1.part
